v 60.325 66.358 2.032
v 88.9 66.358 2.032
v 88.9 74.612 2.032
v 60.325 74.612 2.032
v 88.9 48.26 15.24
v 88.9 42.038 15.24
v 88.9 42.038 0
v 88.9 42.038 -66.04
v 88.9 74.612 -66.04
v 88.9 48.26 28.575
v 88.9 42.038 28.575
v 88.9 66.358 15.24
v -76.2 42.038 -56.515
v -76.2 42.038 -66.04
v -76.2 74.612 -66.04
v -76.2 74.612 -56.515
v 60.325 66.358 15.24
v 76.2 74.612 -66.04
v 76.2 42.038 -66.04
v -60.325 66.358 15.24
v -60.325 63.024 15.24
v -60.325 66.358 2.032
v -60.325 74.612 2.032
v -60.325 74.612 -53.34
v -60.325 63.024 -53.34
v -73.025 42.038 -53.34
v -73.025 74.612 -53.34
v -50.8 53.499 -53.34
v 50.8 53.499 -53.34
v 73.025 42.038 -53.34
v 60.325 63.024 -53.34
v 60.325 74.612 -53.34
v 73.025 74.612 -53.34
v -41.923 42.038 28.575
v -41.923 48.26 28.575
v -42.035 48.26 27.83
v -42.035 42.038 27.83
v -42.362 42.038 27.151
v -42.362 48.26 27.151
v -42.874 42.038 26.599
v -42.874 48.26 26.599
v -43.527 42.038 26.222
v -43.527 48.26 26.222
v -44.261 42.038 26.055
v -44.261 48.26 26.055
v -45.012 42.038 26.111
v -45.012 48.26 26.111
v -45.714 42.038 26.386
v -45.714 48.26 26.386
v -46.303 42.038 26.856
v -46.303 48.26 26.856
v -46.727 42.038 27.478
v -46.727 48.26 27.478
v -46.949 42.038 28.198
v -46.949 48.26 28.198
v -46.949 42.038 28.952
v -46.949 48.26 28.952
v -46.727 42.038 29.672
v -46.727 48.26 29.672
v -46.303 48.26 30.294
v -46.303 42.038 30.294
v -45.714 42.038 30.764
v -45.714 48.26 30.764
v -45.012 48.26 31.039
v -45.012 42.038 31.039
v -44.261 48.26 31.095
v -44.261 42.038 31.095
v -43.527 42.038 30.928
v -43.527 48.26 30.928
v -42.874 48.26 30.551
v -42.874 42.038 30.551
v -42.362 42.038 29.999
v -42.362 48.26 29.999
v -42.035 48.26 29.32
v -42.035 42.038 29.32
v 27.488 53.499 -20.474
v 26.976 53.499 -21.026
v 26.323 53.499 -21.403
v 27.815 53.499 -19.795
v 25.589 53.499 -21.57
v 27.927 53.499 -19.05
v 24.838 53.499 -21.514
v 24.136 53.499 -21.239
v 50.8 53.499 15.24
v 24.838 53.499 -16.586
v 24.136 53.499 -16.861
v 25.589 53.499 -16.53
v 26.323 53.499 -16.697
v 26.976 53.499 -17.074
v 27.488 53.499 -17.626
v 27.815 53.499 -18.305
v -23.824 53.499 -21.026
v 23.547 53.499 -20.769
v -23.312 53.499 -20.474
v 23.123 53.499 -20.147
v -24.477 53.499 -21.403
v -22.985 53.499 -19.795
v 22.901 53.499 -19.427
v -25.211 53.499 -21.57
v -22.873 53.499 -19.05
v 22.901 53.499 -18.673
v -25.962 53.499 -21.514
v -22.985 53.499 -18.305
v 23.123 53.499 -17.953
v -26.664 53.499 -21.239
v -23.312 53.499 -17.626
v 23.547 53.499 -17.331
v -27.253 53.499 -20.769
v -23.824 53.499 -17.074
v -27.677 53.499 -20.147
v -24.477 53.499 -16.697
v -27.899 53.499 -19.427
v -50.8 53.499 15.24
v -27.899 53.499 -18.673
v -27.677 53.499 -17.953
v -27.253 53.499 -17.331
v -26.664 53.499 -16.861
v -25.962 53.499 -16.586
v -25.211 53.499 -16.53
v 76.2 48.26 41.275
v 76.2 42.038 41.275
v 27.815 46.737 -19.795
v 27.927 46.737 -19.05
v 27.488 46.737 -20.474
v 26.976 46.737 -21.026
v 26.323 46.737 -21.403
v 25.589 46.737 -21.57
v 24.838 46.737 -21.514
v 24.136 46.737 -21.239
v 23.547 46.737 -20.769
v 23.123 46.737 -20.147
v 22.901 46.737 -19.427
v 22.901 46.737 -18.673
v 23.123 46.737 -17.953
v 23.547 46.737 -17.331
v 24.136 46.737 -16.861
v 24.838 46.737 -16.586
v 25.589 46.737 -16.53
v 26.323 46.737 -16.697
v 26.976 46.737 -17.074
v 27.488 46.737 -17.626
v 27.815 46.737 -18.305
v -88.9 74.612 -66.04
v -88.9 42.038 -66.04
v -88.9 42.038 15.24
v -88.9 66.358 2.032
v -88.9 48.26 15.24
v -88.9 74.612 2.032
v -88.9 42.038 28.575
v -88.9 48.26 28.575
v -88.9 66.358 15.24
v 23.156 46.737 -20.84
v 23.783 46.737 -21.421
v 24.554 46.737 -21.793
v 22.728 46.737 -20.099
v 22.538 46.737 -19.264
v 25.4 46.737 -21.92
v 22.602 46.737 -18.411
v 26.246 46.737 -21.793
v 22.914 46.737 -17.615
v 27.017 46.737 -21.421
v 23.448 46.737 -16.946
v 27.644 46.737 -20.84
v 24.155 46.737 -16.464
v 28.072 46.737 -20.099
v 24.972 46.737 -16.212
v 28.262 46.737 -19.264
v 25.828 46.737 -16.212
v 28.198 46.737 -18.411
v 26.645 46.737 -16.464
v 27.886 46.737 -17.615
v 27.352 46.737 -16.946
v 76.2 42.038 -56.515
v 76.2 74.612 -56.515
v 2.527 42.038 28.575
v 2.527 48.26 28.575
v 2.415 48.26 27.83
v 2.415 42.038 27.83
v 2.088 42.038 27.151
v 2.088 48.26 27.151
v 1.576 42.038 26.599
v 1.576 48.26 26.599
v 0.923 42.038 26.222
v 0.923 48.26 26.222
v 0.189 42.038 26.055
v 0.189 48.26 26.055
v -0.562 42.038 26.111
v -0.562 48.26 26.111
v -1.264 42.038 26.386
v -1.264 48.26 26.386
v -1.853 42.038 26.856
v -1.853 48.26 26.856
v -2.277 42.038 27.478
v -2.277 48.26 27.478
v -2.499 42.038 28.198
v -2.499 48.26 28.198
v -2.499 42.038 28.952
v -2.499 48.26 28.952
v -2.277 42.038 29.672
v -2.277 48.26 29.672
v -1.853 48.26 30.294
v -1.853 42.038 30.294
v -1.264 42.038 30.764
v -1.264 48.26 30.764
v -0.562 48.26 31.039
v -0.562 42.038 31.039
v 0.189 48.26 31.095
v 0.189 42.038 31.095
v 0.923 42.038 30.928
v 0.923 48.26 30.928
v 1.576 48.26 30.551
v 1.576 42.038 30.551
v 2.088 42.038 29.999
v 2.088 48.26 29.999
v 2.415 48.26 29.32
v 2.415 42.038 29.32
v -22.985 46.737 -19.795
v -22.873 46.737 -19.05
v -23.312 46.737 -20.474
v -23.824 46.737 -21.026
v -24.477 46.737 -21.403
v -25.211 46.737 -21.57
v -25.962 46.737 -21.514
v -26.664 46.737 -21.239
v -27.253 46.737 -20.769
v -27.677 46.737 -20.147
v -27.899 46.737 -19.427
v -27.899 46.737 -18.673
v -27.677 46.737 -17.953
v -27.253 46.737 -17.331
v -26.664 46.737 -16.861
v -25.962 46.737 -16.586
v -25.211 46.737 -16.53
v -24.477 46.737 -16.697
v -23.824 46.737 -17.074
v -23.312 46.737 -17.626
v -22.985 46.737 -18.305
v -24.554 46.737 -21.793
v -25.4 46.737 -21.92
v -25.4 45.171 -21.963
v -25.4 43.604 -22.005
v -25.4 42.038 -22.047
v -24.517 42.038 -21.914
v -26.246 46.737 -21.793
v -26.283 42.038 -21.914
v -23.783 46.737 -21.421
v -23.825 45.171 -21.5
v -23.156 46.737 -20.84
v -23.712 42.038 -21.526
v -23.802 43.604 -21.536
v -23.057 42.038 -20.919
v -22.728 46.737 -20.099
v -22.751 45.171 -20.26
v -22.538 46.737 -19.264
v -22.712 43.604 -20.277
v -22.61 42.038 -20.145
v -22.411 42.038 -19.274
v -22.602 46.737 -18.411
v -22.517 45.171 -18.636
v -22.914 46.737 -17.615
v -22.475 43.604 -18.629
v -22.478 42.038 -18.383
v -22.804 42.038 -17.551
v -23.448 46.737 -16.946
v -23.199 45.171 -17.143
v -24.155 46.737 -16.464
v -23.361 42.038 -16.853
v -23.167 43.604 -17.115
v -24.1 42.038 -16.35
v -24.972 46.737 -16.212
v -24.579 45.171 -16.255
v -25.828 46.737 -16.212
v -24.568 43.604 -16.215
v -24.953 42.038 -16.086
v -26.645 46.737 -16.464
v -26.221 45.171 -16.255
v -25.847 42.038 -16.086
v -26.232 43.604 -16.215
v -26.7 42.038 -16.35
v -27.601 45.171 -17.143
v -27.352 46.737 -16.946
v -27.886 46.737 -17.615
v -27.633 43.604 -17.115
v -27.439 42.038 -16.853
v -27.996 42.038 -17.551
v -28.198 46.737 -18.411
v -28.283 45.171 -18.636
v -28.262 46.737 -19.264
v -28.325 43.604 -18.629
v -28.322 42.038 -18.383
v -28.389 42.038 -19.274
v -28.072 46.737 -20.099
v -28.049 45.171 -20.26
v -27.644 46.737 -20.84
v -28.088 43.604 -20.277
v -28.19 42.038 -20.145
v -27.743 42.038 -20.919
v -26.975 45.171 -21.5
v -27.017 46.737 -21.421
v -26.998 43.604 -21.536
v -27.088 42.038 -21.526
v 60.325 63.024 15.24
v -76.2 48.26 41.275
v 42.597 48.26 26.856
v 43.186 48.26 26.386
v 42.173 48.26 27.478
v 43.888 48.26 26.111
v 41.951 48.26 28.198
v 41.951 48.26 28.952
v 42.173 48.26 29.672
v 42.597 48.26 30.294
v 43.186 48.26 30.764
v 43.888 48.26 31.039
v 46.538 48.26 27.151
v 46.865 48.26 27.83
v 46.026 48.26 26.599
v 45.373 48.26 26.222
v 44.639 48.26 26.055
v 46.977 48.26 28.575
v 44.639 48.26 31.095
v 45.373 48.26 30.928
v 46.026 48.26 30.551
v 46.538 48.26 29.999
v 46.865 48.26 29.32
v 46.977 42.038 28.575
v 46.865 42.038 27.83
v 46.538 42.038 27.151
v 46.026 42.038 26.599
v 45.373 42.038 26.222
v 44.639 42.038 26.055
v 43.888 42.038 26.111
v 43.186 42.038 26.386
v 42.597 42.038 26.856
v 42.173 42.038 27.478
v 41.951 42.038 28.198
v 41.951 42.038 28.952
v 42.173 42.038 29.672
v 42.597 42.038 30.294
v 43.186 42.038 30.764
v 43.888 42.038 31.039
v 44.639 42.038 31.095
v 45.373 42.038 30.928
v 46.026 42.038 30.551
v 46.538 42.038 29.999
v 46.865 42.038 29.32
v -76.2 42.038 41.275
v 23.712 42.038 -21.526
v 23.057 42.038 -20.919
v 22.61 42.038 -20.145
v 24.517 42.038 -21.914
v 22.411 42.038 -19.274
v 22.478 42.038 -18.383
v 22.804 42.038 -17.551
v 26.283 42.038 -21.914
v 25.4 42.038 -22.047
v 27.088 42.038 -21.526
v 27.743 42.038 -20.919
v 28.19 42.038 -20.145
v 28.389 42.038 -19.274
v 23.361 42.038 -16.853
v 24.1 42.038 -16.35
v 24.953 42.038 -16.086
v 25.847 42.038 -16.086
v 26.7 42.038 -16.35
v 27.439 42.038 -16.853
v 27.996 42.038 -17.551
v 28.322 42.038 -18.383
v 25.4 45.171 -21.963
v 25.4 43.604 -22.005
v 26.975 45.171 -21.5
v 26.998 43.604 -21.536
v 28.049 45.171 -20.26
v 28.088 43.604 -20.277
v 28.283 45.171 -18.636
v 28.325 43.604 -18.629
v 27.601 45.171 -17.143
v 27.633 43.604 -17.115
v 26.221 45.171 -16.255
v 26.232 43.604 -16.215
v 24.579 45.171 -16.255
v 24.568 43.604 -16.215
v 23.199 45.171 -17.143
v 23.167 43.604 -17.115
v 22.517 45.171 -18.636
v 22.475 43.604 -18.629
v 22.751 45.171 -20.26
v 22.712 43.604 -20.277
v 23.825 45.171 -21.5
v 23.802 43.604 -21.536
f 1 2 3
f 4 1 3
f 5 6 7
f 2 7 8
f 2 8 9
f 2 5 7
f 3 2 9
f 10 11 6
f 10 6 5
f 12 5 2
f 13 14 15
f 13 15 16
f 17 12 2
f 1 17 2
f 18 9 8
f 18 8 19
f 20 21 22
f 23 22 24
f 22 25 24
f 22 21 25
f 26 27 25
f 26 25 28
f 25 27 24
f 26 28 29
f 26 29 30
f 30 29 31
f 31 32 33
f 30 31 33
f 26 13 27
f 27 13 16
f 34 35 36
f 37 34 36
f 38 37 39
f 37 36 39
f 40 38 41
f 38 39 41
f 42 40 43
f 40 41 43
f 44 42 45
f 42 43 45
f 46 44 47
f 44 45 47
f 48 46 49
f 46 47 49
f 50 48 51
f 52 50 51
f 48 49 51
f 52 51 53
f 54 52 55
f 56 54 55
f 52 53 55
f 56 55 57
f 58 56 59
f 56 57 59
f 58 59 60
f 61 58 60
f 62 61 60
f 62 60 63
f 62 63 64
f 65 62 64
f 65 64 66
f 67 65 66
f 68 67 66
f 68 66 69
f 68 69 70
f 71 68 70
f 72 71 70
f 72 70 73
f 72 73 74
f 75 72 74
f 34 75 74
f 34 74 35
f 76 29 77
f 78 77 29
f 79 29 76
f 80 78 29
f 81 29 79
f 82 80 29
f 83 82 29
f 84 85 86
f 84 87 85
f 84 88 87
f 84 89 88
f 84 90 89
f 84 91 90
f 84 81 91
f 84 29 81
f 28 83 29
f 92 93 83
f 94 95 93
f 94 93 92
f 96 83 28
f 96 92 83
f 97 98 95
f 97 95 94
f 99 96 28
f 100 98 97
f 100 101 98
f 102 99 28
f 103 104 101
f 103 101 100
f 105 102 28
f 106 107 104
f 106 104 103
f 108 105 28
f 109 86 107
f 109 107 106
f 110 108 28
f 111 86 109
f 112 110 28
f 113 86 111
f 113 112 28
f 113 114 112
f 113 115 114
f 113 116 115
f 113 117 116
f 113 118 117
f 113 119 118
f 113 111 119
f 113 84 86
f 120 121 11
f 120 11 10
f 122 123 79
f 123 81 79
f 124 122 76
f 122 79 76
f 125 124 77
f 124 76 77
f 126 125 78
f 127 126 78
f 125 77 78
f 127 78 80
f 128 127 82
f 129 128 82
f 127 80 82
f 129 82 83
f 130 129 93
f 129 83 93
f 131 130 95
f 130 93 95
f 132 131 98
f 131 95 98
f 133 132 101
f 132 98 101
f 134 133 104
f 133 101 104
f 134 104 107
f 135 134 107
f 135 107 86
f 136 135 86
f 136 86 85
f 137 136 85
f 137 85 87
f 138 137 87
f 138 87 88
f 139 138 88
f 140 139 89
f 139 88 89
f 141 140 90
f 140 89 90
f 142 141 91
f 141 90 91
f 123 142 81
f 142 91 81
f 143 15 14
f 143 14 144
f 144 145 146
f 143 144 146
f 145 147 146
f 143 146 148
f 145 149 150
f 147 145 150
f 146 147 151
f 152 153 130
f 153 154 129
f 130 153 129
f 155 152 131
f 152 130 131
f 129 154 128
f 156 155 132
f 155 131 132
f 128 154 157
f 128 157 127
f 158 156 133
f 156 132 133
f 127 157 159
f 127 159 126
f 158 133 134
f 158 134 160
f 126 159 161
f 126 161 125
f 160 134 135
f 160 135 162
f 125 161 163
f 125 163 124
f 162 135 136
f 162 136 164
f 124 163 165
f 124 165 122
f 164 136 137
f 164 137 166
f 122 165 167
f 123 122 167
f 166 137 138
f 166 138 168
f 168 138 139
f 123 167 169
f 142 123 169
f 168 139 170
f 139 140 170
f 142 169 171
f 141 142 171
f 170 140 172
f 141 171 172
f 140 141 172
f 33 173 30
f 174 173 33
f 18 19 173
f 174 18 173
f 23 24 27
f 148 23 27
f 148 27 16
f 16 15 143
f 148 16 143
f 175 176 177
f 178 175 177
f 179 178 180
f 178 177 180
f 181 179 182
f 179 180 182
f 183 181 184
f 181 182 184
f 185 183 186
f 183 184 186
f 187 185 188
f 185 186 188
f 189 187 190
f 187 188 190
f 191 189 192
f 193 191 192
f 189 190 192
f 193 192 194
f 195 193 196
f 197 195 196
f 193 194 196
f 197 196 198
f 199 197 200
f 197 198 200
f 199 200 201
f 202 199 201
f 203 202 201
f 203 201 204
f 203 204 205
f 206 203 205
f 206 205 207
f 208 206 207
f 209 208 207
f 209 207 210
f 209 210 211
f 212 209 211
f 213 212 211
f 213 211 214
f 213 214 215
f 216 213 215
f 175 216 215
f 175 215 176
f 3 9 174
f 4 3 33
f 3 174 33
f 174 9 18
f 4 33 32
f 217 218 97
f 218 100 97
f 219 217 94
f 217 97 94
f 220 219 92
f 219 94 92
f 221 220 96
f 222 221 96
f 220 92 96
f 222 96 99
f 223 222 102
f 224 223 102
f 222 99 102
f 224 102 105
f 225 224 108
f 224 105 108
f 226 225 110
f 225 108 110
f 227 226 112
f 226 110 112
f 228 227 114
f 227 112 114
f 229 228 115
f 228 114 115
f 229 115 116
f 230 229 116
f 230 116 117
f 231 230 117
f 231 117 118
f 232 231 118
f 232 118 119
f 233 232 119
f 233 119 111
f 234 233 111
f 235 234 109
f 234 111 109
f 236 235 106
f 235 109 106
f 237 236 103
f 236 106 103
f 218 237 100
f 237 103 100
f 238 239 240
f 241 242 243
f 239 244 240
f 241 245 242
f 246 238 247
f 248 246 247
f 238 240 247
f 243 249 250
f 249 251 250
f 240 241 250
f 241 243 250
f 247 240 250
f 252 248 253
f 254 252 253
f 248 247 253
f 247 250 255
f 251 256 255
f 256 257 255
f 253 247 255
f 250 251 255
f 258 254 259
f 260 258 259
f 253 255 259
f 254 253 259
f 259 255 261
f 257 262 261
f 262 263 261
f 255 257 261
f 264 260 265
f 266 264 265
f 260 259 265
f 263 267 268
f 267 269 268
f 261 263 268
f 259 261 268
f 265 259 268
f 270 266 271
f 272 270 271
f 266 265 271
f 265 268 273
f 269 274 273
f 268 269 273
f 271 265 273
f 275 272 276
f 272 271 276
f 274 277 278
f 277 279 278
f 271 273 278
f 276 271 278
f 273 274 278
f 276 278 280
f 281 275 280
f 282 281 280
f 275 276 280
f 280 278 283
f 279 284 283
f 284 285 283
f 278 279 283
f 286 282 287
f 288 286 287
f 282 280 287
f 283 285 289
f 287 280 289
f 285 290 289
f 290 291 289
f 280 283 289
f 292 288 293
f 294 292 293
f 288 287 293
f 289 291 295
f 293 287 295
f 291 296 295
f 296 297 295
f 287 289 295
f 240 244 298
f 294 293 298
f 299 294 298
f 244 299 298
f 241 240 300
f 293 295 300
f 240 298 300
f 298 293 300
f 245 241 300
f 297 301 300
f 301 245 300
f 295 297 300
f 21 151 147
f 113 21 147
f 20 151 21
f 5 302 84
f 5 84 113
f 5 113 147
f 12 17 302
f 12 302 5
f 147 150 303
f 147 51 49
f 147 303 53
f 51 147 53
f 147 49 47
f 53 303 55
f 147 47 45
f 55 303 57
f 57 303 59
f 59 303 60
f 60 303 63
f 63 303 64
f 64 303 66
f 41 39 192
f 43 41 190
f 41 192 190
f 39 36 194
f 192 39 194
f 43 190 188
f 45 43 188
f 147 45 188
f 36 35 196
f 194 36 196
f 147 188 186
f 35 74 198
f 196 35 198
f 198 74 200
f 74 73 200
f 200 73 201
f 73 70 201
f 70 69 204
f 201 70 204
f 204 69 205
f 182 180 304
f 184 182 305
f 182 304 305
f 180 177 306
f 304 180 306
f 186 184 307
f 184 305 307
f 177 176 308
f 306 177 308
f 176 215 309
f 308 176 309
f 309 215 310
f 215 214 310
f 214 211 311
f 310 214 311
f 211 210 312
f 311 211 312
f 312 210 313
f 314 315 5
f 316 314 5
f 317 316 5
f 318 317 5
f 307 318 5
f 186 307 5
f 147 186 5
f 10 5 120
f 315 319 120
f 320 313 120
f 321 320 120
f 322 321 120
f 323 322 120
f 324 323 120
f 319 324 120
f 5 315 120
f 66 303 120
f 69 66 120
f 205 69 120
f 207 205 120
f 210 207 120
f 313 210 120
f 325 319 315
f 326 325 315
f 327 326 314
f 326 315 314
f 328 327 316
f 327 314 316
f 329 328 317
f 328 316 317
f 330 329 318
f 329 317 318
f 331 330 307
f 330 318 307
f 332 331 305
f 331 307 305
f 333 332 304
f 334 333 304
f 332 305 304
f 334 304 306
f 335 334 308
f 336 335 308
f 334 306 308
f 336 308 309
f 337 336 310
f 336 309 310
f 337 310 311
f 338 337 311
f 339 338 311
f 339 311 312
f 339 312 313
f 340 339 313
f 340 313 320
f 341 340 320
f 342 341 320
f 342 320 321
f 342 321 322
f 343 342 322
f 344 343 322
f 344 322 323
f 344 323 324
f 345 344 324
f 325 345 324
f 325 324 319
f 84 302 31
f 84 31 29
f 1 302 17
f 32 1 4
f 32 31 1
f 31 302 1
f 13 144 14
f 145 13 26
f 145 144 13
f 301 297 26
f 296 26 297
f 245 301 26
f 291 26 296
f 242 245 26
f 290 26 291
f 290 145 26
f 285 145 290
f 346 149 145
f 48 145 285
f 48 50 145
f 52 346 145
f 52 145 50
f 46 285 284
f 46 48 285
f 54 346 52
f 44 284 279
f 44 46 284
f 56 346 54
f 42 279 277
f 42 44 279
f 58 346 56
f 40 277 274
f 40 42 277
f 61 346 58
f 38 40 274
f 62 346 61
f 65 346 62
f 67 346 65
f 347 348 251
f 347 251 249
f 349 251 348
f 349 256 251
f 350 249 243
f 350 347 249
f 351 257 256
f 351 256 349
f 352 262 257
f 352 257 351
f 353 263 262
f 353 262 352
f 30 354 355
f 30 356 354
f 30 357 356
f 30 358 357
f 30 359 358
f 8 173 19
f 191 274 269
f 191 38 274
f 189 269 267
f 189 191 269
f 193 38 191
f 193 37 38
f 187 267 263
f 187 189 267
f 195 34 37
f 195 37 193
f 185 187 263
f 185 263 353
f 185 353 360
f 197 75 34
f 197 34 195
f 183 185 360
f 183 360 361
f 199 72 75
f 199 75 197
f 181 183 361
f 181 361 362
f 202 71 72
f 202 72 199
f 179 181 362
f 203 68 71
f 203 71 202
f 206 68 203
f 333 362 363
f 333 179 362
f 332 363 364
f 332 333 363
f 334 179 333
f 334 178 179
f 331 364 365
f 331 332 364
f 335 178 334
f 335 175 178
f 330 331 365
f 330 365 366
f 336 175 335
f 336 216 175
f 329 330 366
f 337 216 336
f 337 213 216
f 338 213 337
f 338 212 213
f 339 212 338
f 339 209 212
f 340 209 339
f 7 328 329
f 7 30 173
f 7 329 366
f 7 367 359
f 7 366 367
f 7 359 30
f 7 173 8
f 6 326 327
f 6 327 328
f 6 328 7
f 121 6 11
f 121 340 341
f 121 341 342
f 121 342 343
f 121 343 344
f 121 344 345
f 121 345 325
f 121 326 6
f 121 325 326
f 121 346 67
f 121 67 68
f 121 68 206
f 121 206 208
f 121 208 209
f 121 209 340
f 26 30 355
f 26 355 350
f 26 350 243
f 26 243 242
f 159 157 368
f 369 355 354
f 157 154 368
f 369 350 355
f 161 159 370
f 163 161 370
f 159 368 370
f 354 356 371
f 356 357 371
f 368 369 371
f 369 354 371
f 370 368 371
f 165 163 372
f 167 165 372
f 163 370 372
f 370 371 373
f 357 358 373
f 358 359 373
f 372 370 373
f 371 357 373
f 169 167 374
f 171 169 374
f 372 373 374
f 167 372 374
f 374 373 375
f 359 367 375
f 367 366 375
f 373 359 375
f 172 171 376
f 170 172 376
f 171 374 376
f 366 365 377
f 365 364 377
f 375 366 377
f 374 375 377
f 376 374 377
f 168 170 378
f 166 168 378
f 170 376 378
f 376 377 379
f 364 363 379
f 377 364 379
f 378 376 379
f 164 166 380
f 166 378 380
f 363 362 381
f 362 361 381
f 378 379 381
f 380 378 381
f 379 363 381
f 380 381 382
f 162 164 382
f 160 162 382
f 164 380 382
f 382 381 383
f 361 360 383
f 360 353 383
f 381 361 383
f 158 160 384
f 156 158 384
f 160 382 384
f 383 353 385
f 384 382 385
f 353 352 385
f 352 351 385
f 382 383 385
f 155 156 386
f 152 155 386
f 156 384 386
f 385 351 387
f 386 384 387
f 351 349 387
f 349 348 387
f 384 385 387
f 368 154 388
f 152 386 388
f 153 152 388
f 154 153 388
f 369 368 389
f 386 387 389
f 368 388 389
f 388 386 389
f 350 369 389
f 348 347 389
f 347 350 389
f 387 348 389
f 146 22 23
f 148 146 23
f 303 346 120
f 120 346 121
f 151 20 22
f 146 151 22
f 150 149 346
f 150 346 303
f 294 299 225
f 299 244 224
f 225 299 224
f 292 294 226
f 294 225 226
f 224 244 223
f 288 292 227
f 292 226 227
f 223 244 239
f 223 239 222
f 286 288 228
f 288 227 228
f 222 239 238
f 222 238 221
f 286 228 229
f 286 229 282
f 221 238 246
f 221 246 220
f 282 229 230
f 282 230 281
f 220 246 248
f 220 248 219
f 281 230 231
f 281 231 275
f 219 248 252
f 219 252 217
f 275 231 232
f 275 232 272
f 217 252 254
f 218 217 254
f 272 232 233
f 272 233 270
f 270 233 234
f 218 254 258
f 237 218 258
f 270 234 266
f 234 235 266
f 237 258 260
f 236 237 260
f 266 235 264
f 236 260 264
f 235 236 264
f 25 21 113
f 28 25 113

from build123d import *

# Parameters (mm, degrees)
SKETCH1_W                      = 177.8
SKETCH1_H                      = 35.749524071
BOSS_EXTRUDE1_DEPTH            = 15.24
SKETCH2_W                      = 177.8
SKETCH2_H                      = 107.315000048
BOSS_EXTRUDE2_DEPTH            = 6.222024
CHAMFER1_SIZE                  = 12.7
F_8_0_199_DIAMETER_HOLE2_D     = 5.0546
CUT_EXTRUDE1_DEPTH             = 82.280000048
SKETCH8_W                      = 177.8
SKETCH8_H                      = 29.5275
BOSS_EXTRUDE3_DEPTH            = 66.04
SKETCH9_W                      = 152.4
SKETCH9_H                      = 12.7
CUT_EXTRUDE2_DEPTH             = 36.749524071
SKETCH10_W                     = 177.8
SKETCH10_H                     = 3.175
CUT_EXTRUDE3_DEPTH             = 108.315000048
SKETCH11_W                     = 13.208
SKETCH11_H                     = 8.255
CUT_EXTRUDE4_DEPTH             = 178.8
SKETCH12_W                     = 120.65
SKETCH12_H                     = 11.58875
CUT_EXTRUDE5_DEPTH             = 95.615000048
BOSS_EXTRUDE4_DEPTH            = 68.58
CHAMFER2_SIZE                  = 3.175
F_8_0_199_DIAMETER_HOLE1_D     = 5.0546
F_8_0_199_DIAMETER_HOLE1_DEPTH = 11.460774071
F_8_PLASTIC_INSERT_AT_2_COUNT  = 2
F_8_PLASTIC_INSERT_AT_2_PITCH  = 50.8


with BuildPart() as part:
    # Sketch1 → Boss-Extrude1 (new body)
    with BuildSketch(Plane.XY):
        with Locations((0, 59.912737965)):
            Rectangle(SKETCH1_W, SKETCH1_H)
    extrude(amount=BOSS_EXTRUDE1_DEPTH)

    # Sketch2 → Boss-Extrude2 (add)
    with BuildSketch(Plane.XZ.offset(-42.037975929)):
        with Locations((0, -12.382499976)):
            Rectangle(SKETCH2_W, SKETCH2_H)
    extrude(amount=-BOSS_EXTRUDE2_DEPTH)

    # Chamfer1
    chamfer1_edges = [part.edges().sort_by_distance(p)[0] for p in [
        (88.9, 45.148987929, 41.275000048),
        (-88.9, 45.148987929, 41.275000048),
    ]]
    chamfer(chamfer1_edges, length=CHAMFER1_SIZE)

    # #8 (0.199) Diameter Hole2 (through all)
    with Locations(Plane(origin=(0, 42.037975929, 0), x_dir=(-1, 0, 0), z_dir=(0, -1, 0))):
        with Locations((-44.45, -28.575000048), (0, -28.575000048), (44.45, -28.575000048)):
            Hole(F_8_0_199_DIAMETER_HOLE2_D / 2)

    # Sketch7 → Cut-Extrude1 (cut, through all)
    with BuildSketch(Plane.XY.offset(15.240000048)):
        with BuildLine():
            Line((-50.8, 72.54875), (50.8, 72.54875))
            ThreePointArc((50.8, 72.54875), (60.325, 63.02375), (50.8, 53.49875))
            Line((50.8, 53.49875), (-50.8, 53.49875))
            ThreePointArc((-50.8, 53.49875), (-60.325, 63.02375), (-50.8, 72.54875))
        make_face()
    extrude(amount=-CUT_EXTRUDE1_DEPTH, mode=Mode.SUBTRACT)

    # Sketch8 → Boss-Extrude3 (add)
    with BuildSketch(Plane(origin=(0, 0, 0), x_dir=(-1, 0, 0), z_dir=(0, 0, -1))):
        with Locations((0, 63.02375)):
            Rectangle(SKETCH8_W, SKETCH8_H)
        with BuildLine():
            Line((50.8, 72.54875), (-50.8, 72.54875))
            ThreePointArc((-50.8, 72.54875), (-60.325, 63.02375), (-50.8, 53.49875))
            Line((-50.8, 53.49875), (50.8, 53.49875))
            ThreePointArc((50.8, 53.49875), (60.325, 63.02375), (50.8, 72.54875))
        make_face(mode=Mode.SUBTRACT)
    extrude(amount=BOSS_EXTRUDE3_DEPTH)

    # Sketch9 → Cut-Extrude2 (cut, through all)
    with BuildSketch(Plane.XZ.offset(-42.037975929)):
        with Locations((0, -59.69)):
            Rectangle(SKETCH9_W, SKETCH9_H)
    extrude(amount=-CUT_EXTRUDE2_DEPTH, mode=Mode.SUBTRACT)

    # Sketch10 → Cut-Extrude3 (cut, through all)
    with BuildSketch(Plane(origin=(0, 0, -66.04), x_dir=(-1, 0, 0), z_dir=(0, 0, -1))):
        with Locations((0, 76.2)):
            Rectangle(SKETCH10_W, SKETCH10_H)
    extrude(amount=-CUT_EXTRUDE3_DEPTH, mode=Mode.SUBTRACT)

    # Sketch11 → Cut-Extrude4 (cut, through all)
    with BuildSketch(Plane(origin=(88.9, 0, 0), x_dir=(0, 0, -1), z_dir=(1, 0, 0))):
        with Locations((-8.636000048, 70.485)):
            Rectangle(SKETCH11_W, SKETCH11_H)
    extrude(amount=-CUT_EXTRUDE4_DEPTH, mode=Mode.SUBTRACT)

    # Sketch12 → Cut-Extrude5 (cut, through all)
    with BuildSketch(Plane(origin=(0, 0, -53.34), x_dir=(-1, 0, 0), z_dir=(0, 0, -1))):
        with Locations((0, 68.818125)):
            Rectangle(SKETCH12_W, SKETCH12_H)
    extrude(amount=-CUT_EXTRUDE5_DEPTH, mode=Mode.SUBTRACT)

    # Sketch13 → Boss-Extrude4 (add)
    with BuildSketch(Plane.XY.offset(15.240000048)):
        with BuildLine():
            Line((60.325, 63.02375), (50.8, 53.49875))
            ThreePointArc((50.8, 53.49875), (57.535192091, 56.288557909), (60.325, 63.02375))
        make_face()
        with BuildLine():
            Line((-60.325, 63.02375), (-50.8, 53.49875))
            ThreePointArc((-50.8, 53.49875), (-57.535192091, 56.288557909), (-60.325, 63.02375))
        make_face()
    extrude(amount=-BOSS_EXTRUDE4_DEPTH)

    # Chamfer2
    chamfer2_edges = [part.edges().sort_by_distance(p)[0] for p in [
        (-76.2, 58.325237965, -53.34),
        (76.2, 58.325237965, -53.34),
    ]]
    chamfer(chamfer2_edges, length=CHAMFER2_SIZE)

    # #8 (0.199) Diameter Hole1
    with Locations(Plane(origin=(9.884621419, 42.037975929, -19.494996768), x_dir=(-1, 0, 0), z_dir=(0, -1, 0))):
        with Locations((-15.515378581, -0.444996793), (35.284621419, -0.444996793)):
            Hole(F_8_0_199_DIAMETER_HOLE1_D / 2, depth=F_8_0_199_DIAMETER_HOLE1_DEPTH)

    # Sketch51 → #8 Plastic Insert (revolve, cut)
    with BuildSketch(Plane(origin=(25.4, 42.037975929, -19.049999976), x_dir=(0, 0, -1), z_dir=(1, 0, 0))):
        Polygon((0, 0), (0, 4.699), (2.8702, 4.699), (2.9972, 0), align=None)
    f_8_plastic_insert = revolve(axis=Axis((25.4, 152.037975929, -19.049999976), (0, -1, 0)), mode=Mode.SUBTRACT)

    # #8 Plastic Insert at 2: #8 Plastic Insert ×2
    with Locations(*[(-i * F_8_PLASTIC_INSERT_AT_2_PITCH, 0, 0) for i in range(1, F_8_PLASTIC_INSERT_AT_2_COUNT)]):
        add(f_8_plastic_insert, mode=Mode.SUBTRACT)


solid = part.part
